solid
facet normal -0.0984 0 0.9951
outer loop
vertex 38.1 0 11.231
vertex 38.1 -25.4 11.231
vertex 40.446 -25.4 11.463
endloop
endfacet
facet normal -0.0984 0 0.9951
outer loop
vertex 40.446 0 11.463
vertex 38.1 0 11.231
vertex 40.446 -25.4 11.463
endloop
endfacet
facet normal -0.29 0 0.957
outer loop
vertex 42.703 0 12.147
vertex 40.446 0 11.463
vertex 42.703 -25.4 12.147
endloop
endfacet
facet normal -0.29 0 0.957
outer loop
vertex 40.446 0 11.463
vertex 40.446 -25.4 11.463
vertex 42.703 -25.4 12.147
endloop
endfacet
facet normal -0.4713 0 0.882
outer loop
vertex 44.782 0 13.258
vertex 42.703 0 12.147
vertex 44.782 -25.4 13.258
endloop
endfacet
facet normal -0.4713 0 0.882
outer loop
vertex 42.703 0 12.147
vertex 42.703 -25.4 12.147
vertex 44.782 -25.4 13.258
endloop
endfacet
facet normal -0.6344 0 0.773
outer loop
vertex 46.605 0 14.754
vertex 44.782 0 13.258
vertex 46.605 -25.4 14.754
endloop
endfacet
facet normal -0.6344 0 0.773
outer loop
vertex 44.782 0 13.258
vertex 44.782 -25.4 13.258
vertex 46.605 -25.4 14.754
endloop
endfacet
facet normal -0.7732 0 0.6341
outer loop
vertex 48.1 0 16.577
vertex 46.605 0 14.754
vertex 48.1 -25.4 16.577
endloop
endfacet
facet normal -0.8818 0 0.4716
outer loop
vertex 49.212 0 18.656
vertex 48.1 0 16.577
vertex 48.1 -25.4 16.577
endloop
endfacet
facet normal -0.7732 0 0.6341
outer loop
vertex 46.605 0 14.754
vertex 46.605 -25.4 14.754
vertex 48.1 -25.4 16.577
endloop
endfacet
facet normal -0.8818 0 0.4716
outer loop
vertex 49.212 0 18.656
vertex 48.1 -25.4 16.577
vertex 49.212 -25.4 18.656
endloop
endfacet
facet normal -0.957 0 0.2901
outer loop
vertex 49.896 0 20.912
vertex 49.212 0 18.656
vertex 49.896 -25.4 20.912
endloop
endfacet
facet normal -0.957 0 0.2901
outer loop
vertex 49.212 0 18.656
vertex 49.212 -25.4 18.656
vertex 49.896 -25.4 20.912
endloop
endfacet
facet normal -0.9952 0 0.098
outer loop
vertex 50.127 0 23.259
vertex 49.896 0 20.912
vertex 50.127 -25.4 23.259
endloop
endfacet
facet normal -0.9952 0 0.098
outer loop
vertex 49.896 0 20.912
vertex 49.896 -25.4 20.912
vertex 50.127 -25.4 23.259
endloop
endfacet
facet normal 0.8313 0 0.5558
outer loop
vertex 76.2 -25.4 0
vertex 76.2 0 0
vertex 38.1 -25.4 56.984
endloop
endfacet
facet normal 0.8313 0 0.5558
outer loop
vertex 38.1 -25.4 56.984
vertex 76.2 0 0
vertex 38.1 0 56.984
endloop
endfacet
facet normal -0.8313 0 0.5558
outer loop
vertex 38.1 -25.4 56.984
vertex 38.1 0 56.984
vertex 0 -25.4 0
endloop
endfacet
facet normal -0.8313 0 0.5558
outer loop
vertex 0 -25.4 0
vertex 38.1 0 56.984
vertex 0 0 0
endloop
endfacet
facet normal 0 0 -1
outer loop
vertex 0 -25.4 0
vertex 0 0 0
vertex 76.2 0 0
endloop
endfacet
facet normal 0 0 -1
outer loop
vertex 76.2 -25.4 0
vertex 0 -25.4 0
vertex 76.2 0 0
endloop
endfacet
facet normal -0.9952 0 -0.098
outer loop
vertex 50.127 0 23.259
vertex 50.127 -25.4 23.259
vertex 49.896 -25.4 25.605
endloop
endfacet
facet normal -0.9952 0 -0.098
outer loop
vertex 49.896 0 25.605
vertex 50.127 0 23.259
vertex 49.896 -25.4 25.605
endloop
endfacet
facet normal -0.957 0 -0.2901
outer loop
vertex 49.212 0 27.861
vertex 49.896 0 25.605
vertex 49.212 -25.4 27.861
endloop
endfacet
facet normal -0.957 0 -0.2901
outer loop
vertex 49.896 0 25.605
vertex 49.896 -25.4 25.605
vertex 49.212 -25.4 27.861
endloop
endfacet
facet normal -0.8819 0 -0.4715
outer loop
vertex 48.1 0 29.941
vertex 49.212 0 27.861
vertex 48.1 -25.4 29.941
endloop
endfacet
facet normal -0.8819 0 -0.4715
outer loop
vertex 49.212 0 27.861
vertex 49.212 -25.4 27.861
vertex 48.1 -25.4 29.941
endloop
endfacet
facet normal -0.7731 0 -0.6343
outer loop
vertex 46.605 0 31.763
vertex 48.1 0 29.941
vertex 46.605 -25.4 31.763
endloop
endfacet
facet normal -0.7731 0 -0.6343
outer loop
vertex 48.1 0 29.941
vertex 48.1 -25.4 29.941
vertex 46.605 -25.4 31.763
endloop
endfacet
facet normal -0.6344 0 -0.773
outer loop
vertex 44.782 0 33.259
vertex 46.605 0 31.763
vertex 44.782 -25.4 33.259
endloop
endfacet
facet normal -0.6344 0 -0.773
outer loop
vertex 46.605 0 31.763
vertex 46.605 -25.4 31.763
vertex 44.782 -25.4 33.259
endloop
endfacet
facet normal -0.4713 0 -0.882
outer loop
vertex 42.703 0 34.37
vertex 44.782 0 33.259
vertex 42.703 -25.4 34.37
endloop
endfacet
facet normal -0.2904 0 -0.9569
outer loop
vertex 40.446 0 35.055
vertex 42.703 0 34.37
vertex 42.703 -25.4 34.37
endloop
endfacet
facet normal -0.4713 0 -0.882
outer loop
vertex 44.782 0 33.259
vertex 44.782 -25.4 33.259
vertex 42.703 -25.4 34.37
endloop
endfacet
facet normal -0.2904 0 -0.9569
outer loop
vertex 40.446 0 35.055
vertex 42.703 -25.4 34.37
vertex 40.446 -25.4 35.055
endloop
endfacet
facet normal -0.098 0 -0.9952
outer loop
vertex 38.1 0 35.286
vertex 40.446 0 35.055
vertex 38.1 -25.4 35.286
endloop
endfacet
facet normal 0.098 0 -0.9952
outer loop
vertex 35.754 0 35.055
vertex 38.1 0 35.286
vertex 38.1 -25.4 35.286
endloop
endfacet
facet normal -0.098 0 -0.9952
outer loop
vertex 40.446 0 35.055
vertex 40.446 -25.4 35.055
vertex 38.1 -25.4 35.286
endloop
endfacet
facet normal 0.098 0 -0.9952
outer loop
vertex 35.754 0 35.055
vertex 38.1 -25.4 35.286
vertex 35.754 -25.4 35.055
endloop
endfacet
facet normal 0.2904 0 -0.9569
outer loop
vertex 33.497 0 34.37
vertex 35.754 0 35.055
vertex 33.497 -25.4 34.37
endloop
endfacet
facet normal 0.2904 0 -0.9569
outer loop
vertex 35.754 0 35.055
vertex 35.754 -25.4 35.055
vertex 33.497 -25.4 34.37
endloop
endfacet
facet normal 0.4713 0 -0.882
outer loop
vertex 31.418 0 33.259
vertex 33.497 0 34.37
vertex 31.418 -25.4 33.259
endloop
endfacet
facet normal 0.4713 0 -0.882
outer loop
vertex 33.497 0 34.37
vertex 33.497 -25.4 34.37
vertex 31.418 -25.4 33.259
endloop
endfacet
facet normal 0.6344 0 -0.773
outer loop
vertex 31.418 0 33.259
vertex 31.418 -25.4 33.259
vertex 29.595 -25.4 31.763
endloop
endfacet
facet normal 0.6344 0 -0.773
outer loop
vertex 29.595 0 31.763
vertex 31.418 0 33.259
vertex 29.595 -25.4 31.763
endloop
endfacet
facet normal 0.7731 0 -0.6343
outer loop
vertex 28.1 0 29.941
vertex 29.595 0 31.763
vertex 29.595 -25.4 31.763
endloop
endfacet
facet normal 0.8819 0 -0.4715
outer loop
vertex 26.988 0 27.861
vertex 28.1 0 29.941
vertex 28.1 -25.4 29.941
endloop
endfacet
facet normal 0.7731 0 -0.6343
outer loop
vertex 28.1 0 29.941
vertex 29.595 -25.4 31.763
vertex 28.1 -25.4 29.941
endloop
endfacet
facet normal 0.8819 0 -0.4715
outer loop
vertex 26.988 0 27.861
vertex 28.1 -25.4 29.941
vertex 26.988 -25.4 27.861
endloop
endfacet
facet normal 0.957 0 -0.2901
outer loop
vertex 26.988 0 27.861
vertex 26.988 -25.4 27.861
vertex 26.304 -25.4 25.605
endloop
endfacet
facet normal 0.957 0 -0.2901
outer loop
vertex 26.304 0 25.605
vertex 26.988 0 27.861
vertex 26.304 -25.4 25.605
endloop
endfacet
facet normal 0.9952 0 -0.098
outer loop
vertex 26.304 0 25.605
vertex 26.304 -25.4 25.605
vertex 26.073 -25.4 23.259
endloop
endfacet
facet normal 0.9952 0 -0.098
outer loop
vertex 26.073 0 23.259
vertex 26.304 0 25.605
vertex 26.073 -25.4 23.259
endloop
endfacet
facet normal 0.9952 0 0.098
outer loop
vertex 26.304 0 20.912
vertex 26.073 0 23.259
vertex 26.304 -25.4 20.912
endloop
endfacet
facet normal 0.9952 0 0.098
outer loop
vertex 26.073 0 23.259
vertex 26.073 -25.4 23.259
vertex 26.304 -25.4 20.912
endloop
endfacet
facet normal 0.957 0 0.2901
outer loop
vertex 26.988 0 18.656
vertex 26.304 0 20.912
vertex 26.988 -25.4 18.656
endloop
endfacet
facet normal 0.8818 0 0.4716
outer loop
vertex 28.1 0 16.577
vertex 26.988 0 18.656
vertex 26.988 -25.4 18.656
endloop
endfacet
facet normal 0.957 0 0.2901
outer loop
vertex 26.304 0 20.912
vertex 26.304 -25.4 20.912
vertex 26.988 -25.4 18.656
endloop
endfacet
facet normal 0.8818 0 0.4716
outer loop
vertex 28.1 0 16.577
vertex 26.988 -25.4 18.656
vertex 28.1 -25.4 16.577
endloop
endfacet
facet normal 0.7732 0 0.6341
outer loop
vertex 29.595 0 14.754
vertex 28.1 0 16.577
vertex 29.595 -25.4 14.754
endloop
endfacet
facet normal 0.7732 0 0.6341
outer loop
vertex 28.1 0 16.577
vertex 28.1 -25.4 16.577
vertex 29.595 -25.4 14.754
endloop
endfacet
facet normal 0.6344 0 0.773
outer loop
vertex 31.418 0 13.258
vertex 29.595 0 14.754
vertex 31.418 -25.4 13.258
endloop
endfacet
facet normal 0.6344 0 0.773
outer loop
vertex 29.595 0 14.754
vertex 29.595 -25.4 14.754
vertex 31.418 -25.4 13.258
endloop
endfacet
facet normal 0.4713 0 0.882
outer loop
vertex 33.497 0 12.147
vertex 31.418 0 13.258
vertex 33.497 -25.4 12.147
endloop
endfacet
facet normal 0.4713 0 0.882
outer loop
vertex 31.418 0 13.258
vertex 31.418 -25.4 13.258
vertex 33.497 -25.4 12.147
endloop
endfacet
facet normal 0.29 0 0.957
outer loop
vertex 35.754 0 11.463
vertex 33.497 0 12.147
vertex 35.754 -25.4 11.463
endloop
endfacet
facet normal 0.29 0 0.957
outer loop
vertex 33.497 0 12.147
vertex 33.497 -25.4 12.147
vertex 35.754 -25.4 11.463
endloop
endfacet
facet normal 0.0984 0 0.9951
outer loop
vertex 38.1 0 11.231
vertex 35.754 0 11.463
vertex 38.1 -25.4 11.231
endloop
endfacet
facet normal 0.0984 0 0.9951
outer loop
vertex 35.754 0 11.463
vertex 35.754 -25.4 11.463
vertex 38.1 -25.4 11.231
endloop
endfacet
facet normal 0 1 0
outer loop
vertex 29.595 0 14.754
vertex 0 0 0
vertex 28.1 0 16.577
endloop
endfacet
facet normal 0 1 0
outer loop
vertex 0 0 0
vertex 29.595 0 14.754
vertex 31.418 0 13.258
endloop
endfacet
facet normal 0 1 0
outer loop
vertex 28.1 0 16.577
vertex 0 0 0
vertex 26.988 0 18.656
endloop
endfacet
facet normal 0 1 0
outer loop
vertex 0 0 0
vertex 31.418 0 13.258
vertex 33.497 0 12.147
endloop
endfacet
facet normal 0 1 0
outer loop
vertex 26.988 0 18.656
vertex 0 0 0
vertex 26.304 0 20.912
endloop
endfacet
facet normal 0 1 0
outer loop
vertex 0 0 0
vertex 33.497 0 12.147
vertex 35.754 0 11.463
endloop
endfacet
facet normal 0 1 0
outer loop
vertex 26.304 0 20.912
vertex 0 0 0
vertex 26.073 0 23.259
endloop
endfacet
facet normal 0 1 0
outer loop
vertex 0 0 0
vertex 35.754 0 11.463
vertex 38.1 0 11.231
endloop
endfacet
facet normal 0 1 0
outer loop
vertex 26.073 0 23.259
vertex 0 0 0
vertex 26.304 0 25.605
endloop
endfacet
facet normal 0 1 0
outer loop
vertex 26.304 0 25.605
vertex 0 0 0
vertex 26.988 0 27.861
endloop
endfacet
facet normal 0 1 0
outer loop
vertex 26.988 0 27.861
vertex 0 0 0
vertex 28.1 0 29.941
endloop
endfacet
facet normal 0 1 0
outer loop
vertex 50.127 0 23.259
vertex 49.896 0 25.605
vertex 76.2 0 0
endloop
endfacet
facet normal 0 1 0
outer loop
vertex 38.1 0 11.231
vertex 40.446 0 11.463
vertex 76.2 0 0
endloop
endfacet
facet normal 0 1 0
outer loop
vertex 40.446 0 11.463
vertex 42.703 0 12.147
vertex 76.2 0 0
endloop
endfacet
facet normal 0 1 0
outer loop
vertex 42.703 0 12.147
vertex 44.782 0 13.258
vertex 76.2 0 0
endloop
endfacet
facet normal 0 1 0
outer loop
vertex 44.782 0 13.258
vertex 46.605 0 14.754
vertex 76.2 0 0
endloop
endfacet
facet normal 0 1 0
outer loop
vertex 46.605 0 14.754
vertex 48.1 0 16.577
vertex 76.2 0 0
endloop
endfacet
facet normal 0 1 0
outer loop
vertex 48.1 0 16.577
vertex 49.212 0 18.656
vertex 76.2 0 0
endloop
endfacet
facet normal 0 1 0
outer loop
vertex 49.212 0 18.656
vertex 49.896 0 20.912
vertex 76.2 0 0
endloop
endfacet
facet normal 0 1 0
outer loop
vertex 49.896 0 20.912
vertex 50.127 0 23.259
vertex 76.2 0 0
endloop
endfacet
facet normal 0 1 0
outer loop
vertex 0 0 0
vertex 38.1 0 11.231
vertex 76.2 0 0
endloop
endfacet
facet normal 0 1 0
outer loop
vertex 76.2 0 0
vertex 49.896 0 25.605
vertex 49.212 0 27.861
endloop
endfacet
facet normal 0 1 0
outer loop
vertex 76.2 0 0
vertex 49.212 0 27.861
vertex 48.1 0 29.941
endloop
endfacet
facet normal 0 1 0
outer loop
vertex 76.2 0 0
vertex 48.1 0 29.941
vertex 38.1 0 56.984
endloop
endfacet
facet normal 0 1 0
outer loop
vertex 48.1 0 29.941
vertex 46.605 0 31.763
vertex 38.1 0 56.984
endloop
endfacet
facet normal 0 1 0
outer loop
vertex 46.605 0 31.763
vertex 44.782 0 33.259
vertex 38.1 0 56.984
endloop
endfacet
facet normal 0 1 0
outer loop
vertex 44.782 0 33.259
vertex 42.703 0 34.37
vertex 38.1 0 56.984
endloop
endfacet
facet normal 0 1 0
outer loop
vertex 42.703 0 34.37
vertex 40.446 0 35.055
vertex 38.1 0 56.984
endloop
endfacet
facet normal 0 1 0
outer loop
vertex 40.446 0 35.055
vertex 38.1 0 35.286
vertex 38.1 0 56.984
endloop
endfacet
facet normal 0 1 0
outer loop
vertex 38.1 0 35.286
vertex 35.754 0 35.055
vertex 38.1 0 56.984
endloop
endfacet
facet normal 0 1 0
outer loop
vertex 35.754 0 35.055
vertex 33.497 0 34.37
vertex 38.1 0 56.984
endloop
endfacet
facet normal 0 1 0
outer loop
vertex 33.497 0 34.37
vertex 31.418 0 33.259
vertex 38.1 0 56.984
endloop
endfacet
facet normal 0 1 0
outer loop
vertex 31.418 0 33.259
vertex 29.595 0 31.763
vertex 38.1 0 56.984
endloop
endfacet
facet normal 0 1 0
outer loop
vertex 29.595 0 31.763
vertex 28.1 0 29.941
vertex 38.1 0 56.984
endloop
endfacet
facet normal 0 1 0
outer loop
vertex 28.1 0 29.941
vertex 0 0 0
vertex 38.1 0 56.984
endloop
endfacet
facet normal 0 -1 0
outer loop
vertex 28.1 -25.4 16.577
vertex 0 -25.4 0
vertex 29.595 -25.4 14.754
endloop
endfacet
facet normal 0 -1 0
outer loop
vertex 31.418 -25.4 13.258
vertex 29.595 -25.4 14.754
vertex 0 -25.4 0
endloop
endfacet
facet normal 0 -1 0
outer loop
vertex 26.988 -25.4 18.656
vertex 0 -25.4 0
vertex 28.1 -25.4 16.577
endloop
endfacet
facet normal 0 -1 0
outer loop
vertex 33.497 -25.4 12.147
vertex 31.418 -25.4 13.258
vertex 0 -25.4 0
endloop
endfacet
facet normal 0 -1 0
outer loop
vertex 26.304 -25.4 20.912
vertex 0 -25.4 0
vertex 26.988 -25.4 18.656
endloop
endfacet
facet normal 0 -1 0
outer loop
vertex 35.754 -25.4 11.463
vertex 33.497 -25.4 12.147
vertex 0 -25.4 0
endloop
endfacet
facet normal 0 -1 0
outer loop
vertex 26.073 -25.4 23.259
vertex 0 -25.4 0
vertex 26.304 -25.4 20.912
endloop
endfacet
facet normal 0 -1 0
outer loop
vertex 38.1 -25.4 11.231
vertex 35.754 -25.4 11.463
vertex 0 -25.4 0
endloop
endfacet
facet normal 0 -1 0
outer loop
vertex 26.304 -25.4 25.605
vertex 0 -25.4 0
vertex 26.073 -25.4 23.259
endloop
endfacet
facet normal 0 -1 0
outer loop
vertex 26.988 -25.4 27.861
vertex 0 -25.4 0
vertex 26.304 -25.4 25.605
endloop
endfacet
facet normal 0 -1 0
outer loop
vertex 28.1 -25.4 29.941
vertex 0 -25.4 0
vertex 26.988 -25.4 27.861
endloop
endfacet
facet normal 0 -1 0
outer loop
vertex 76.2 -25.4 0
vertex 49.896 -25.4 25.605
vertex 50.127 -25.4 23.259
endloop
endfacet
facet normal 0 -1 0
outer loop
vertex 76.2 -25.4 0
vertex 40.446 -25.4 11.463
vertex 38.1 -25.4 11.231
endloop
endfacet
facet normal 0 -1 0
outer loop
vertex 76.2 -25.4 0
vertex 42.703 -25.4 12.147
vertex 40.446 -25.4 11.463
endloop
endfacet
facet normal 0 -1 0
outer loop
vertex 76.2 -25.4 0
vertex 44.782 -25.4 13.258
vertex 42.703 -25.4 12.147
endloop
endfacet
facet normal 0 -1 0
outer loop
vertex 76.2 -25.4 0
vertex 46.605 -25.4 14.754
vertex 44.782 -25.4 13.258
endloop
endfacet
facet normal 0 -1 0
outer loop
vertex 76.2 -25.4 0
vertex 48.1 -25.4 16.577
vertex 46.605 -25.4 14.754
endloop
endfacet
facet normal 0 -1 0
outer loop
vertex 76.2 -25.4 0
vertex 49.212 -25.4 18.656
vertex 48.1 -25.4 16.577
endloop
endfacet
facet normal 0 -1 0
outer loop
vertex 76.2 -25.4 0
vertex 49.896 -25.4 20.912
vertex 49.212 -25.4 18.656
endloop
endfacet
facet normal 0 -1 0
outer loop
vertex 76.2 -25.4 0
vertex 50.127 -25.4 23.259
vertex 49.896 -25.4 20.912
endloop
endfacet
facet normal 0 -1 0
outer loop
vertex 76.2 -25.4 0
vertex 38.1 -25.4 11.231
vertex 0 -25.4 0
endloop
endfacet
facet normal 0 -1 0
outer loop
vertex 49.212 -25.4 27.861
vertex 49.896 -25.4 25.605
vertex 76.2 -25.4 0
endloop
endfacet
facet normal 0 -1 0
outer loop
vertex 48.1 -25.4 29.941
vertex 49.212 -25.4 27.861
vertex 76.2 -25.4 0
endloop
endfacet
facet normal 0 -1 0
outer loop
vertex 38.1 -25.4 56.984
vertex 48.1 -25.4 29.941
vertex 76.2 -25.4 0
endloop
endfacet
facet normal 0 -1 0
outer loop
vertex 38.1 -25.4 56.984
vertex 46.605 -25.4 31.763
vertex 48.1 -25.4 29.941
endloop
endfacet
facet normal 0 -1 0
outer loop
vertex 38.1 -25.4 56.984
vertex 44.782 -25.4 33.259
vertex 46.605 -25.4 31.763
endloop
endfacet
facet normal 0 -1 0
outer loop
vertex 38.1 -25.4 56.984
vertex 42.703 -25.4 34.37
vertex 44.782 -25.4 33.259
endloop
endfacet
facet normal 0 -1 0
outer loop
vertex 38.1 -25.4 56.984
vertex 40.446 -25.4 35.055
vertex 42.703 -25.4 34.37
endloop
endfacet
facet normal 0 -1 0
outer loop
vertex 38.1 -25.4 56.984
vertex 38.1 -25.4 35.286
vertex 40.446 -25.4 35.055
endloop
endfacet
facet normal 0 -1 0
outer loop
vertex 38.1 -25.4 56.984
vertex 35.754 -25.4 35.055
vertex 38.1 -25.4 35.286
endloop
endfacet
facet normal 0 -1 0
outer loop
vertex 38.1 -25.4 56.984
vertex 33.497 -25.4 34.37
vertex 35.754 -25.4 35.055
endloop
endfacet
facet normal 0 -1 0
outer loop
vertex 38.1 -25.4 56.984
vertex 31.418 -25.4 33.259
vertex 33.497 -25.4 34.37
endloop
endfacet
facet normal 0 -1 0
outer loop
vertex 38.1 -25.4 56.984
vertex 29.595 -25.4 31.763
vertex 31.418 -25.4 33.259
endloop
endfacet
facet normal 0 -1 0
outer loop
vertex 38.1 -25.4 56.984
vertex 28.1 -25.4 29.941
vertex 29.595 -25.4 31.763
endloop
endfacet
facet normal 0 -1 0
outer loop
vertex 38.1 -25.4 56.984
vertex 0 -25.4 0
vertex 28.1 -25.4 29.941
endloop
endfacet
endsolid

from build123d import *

# Parameters (mm, degrees)
F1_DEPTH = 25.4
F3_DEPTH = 25.4


with BuildPart() as f1:
    # F0 (on Front) → F1 (new body)
    with BuildSketch(Plane.XZ):
        Polygon((38.1, 56.983866), (0, 0), (76.2, 0), align=None)
    extrude(amount=F1_DEPTH)

    # F2 (on face) → F3 (cut)
    with BuildSketch(Plane.XZ.offset(25.4)):
        with BuildLine():
            ThreePointArc((50.127231, 23.25872), (29.595463, 31.763256), (38.1, 11.231488))
            ThreePointArc((38.1, 11.231488), (46.604537, 14.754183), (50.127231, 23.25872))
        make_face()
    extrude(amount=-F3_DEPTH, mode=Mode.SUBTRACT)


solid = f1.part
